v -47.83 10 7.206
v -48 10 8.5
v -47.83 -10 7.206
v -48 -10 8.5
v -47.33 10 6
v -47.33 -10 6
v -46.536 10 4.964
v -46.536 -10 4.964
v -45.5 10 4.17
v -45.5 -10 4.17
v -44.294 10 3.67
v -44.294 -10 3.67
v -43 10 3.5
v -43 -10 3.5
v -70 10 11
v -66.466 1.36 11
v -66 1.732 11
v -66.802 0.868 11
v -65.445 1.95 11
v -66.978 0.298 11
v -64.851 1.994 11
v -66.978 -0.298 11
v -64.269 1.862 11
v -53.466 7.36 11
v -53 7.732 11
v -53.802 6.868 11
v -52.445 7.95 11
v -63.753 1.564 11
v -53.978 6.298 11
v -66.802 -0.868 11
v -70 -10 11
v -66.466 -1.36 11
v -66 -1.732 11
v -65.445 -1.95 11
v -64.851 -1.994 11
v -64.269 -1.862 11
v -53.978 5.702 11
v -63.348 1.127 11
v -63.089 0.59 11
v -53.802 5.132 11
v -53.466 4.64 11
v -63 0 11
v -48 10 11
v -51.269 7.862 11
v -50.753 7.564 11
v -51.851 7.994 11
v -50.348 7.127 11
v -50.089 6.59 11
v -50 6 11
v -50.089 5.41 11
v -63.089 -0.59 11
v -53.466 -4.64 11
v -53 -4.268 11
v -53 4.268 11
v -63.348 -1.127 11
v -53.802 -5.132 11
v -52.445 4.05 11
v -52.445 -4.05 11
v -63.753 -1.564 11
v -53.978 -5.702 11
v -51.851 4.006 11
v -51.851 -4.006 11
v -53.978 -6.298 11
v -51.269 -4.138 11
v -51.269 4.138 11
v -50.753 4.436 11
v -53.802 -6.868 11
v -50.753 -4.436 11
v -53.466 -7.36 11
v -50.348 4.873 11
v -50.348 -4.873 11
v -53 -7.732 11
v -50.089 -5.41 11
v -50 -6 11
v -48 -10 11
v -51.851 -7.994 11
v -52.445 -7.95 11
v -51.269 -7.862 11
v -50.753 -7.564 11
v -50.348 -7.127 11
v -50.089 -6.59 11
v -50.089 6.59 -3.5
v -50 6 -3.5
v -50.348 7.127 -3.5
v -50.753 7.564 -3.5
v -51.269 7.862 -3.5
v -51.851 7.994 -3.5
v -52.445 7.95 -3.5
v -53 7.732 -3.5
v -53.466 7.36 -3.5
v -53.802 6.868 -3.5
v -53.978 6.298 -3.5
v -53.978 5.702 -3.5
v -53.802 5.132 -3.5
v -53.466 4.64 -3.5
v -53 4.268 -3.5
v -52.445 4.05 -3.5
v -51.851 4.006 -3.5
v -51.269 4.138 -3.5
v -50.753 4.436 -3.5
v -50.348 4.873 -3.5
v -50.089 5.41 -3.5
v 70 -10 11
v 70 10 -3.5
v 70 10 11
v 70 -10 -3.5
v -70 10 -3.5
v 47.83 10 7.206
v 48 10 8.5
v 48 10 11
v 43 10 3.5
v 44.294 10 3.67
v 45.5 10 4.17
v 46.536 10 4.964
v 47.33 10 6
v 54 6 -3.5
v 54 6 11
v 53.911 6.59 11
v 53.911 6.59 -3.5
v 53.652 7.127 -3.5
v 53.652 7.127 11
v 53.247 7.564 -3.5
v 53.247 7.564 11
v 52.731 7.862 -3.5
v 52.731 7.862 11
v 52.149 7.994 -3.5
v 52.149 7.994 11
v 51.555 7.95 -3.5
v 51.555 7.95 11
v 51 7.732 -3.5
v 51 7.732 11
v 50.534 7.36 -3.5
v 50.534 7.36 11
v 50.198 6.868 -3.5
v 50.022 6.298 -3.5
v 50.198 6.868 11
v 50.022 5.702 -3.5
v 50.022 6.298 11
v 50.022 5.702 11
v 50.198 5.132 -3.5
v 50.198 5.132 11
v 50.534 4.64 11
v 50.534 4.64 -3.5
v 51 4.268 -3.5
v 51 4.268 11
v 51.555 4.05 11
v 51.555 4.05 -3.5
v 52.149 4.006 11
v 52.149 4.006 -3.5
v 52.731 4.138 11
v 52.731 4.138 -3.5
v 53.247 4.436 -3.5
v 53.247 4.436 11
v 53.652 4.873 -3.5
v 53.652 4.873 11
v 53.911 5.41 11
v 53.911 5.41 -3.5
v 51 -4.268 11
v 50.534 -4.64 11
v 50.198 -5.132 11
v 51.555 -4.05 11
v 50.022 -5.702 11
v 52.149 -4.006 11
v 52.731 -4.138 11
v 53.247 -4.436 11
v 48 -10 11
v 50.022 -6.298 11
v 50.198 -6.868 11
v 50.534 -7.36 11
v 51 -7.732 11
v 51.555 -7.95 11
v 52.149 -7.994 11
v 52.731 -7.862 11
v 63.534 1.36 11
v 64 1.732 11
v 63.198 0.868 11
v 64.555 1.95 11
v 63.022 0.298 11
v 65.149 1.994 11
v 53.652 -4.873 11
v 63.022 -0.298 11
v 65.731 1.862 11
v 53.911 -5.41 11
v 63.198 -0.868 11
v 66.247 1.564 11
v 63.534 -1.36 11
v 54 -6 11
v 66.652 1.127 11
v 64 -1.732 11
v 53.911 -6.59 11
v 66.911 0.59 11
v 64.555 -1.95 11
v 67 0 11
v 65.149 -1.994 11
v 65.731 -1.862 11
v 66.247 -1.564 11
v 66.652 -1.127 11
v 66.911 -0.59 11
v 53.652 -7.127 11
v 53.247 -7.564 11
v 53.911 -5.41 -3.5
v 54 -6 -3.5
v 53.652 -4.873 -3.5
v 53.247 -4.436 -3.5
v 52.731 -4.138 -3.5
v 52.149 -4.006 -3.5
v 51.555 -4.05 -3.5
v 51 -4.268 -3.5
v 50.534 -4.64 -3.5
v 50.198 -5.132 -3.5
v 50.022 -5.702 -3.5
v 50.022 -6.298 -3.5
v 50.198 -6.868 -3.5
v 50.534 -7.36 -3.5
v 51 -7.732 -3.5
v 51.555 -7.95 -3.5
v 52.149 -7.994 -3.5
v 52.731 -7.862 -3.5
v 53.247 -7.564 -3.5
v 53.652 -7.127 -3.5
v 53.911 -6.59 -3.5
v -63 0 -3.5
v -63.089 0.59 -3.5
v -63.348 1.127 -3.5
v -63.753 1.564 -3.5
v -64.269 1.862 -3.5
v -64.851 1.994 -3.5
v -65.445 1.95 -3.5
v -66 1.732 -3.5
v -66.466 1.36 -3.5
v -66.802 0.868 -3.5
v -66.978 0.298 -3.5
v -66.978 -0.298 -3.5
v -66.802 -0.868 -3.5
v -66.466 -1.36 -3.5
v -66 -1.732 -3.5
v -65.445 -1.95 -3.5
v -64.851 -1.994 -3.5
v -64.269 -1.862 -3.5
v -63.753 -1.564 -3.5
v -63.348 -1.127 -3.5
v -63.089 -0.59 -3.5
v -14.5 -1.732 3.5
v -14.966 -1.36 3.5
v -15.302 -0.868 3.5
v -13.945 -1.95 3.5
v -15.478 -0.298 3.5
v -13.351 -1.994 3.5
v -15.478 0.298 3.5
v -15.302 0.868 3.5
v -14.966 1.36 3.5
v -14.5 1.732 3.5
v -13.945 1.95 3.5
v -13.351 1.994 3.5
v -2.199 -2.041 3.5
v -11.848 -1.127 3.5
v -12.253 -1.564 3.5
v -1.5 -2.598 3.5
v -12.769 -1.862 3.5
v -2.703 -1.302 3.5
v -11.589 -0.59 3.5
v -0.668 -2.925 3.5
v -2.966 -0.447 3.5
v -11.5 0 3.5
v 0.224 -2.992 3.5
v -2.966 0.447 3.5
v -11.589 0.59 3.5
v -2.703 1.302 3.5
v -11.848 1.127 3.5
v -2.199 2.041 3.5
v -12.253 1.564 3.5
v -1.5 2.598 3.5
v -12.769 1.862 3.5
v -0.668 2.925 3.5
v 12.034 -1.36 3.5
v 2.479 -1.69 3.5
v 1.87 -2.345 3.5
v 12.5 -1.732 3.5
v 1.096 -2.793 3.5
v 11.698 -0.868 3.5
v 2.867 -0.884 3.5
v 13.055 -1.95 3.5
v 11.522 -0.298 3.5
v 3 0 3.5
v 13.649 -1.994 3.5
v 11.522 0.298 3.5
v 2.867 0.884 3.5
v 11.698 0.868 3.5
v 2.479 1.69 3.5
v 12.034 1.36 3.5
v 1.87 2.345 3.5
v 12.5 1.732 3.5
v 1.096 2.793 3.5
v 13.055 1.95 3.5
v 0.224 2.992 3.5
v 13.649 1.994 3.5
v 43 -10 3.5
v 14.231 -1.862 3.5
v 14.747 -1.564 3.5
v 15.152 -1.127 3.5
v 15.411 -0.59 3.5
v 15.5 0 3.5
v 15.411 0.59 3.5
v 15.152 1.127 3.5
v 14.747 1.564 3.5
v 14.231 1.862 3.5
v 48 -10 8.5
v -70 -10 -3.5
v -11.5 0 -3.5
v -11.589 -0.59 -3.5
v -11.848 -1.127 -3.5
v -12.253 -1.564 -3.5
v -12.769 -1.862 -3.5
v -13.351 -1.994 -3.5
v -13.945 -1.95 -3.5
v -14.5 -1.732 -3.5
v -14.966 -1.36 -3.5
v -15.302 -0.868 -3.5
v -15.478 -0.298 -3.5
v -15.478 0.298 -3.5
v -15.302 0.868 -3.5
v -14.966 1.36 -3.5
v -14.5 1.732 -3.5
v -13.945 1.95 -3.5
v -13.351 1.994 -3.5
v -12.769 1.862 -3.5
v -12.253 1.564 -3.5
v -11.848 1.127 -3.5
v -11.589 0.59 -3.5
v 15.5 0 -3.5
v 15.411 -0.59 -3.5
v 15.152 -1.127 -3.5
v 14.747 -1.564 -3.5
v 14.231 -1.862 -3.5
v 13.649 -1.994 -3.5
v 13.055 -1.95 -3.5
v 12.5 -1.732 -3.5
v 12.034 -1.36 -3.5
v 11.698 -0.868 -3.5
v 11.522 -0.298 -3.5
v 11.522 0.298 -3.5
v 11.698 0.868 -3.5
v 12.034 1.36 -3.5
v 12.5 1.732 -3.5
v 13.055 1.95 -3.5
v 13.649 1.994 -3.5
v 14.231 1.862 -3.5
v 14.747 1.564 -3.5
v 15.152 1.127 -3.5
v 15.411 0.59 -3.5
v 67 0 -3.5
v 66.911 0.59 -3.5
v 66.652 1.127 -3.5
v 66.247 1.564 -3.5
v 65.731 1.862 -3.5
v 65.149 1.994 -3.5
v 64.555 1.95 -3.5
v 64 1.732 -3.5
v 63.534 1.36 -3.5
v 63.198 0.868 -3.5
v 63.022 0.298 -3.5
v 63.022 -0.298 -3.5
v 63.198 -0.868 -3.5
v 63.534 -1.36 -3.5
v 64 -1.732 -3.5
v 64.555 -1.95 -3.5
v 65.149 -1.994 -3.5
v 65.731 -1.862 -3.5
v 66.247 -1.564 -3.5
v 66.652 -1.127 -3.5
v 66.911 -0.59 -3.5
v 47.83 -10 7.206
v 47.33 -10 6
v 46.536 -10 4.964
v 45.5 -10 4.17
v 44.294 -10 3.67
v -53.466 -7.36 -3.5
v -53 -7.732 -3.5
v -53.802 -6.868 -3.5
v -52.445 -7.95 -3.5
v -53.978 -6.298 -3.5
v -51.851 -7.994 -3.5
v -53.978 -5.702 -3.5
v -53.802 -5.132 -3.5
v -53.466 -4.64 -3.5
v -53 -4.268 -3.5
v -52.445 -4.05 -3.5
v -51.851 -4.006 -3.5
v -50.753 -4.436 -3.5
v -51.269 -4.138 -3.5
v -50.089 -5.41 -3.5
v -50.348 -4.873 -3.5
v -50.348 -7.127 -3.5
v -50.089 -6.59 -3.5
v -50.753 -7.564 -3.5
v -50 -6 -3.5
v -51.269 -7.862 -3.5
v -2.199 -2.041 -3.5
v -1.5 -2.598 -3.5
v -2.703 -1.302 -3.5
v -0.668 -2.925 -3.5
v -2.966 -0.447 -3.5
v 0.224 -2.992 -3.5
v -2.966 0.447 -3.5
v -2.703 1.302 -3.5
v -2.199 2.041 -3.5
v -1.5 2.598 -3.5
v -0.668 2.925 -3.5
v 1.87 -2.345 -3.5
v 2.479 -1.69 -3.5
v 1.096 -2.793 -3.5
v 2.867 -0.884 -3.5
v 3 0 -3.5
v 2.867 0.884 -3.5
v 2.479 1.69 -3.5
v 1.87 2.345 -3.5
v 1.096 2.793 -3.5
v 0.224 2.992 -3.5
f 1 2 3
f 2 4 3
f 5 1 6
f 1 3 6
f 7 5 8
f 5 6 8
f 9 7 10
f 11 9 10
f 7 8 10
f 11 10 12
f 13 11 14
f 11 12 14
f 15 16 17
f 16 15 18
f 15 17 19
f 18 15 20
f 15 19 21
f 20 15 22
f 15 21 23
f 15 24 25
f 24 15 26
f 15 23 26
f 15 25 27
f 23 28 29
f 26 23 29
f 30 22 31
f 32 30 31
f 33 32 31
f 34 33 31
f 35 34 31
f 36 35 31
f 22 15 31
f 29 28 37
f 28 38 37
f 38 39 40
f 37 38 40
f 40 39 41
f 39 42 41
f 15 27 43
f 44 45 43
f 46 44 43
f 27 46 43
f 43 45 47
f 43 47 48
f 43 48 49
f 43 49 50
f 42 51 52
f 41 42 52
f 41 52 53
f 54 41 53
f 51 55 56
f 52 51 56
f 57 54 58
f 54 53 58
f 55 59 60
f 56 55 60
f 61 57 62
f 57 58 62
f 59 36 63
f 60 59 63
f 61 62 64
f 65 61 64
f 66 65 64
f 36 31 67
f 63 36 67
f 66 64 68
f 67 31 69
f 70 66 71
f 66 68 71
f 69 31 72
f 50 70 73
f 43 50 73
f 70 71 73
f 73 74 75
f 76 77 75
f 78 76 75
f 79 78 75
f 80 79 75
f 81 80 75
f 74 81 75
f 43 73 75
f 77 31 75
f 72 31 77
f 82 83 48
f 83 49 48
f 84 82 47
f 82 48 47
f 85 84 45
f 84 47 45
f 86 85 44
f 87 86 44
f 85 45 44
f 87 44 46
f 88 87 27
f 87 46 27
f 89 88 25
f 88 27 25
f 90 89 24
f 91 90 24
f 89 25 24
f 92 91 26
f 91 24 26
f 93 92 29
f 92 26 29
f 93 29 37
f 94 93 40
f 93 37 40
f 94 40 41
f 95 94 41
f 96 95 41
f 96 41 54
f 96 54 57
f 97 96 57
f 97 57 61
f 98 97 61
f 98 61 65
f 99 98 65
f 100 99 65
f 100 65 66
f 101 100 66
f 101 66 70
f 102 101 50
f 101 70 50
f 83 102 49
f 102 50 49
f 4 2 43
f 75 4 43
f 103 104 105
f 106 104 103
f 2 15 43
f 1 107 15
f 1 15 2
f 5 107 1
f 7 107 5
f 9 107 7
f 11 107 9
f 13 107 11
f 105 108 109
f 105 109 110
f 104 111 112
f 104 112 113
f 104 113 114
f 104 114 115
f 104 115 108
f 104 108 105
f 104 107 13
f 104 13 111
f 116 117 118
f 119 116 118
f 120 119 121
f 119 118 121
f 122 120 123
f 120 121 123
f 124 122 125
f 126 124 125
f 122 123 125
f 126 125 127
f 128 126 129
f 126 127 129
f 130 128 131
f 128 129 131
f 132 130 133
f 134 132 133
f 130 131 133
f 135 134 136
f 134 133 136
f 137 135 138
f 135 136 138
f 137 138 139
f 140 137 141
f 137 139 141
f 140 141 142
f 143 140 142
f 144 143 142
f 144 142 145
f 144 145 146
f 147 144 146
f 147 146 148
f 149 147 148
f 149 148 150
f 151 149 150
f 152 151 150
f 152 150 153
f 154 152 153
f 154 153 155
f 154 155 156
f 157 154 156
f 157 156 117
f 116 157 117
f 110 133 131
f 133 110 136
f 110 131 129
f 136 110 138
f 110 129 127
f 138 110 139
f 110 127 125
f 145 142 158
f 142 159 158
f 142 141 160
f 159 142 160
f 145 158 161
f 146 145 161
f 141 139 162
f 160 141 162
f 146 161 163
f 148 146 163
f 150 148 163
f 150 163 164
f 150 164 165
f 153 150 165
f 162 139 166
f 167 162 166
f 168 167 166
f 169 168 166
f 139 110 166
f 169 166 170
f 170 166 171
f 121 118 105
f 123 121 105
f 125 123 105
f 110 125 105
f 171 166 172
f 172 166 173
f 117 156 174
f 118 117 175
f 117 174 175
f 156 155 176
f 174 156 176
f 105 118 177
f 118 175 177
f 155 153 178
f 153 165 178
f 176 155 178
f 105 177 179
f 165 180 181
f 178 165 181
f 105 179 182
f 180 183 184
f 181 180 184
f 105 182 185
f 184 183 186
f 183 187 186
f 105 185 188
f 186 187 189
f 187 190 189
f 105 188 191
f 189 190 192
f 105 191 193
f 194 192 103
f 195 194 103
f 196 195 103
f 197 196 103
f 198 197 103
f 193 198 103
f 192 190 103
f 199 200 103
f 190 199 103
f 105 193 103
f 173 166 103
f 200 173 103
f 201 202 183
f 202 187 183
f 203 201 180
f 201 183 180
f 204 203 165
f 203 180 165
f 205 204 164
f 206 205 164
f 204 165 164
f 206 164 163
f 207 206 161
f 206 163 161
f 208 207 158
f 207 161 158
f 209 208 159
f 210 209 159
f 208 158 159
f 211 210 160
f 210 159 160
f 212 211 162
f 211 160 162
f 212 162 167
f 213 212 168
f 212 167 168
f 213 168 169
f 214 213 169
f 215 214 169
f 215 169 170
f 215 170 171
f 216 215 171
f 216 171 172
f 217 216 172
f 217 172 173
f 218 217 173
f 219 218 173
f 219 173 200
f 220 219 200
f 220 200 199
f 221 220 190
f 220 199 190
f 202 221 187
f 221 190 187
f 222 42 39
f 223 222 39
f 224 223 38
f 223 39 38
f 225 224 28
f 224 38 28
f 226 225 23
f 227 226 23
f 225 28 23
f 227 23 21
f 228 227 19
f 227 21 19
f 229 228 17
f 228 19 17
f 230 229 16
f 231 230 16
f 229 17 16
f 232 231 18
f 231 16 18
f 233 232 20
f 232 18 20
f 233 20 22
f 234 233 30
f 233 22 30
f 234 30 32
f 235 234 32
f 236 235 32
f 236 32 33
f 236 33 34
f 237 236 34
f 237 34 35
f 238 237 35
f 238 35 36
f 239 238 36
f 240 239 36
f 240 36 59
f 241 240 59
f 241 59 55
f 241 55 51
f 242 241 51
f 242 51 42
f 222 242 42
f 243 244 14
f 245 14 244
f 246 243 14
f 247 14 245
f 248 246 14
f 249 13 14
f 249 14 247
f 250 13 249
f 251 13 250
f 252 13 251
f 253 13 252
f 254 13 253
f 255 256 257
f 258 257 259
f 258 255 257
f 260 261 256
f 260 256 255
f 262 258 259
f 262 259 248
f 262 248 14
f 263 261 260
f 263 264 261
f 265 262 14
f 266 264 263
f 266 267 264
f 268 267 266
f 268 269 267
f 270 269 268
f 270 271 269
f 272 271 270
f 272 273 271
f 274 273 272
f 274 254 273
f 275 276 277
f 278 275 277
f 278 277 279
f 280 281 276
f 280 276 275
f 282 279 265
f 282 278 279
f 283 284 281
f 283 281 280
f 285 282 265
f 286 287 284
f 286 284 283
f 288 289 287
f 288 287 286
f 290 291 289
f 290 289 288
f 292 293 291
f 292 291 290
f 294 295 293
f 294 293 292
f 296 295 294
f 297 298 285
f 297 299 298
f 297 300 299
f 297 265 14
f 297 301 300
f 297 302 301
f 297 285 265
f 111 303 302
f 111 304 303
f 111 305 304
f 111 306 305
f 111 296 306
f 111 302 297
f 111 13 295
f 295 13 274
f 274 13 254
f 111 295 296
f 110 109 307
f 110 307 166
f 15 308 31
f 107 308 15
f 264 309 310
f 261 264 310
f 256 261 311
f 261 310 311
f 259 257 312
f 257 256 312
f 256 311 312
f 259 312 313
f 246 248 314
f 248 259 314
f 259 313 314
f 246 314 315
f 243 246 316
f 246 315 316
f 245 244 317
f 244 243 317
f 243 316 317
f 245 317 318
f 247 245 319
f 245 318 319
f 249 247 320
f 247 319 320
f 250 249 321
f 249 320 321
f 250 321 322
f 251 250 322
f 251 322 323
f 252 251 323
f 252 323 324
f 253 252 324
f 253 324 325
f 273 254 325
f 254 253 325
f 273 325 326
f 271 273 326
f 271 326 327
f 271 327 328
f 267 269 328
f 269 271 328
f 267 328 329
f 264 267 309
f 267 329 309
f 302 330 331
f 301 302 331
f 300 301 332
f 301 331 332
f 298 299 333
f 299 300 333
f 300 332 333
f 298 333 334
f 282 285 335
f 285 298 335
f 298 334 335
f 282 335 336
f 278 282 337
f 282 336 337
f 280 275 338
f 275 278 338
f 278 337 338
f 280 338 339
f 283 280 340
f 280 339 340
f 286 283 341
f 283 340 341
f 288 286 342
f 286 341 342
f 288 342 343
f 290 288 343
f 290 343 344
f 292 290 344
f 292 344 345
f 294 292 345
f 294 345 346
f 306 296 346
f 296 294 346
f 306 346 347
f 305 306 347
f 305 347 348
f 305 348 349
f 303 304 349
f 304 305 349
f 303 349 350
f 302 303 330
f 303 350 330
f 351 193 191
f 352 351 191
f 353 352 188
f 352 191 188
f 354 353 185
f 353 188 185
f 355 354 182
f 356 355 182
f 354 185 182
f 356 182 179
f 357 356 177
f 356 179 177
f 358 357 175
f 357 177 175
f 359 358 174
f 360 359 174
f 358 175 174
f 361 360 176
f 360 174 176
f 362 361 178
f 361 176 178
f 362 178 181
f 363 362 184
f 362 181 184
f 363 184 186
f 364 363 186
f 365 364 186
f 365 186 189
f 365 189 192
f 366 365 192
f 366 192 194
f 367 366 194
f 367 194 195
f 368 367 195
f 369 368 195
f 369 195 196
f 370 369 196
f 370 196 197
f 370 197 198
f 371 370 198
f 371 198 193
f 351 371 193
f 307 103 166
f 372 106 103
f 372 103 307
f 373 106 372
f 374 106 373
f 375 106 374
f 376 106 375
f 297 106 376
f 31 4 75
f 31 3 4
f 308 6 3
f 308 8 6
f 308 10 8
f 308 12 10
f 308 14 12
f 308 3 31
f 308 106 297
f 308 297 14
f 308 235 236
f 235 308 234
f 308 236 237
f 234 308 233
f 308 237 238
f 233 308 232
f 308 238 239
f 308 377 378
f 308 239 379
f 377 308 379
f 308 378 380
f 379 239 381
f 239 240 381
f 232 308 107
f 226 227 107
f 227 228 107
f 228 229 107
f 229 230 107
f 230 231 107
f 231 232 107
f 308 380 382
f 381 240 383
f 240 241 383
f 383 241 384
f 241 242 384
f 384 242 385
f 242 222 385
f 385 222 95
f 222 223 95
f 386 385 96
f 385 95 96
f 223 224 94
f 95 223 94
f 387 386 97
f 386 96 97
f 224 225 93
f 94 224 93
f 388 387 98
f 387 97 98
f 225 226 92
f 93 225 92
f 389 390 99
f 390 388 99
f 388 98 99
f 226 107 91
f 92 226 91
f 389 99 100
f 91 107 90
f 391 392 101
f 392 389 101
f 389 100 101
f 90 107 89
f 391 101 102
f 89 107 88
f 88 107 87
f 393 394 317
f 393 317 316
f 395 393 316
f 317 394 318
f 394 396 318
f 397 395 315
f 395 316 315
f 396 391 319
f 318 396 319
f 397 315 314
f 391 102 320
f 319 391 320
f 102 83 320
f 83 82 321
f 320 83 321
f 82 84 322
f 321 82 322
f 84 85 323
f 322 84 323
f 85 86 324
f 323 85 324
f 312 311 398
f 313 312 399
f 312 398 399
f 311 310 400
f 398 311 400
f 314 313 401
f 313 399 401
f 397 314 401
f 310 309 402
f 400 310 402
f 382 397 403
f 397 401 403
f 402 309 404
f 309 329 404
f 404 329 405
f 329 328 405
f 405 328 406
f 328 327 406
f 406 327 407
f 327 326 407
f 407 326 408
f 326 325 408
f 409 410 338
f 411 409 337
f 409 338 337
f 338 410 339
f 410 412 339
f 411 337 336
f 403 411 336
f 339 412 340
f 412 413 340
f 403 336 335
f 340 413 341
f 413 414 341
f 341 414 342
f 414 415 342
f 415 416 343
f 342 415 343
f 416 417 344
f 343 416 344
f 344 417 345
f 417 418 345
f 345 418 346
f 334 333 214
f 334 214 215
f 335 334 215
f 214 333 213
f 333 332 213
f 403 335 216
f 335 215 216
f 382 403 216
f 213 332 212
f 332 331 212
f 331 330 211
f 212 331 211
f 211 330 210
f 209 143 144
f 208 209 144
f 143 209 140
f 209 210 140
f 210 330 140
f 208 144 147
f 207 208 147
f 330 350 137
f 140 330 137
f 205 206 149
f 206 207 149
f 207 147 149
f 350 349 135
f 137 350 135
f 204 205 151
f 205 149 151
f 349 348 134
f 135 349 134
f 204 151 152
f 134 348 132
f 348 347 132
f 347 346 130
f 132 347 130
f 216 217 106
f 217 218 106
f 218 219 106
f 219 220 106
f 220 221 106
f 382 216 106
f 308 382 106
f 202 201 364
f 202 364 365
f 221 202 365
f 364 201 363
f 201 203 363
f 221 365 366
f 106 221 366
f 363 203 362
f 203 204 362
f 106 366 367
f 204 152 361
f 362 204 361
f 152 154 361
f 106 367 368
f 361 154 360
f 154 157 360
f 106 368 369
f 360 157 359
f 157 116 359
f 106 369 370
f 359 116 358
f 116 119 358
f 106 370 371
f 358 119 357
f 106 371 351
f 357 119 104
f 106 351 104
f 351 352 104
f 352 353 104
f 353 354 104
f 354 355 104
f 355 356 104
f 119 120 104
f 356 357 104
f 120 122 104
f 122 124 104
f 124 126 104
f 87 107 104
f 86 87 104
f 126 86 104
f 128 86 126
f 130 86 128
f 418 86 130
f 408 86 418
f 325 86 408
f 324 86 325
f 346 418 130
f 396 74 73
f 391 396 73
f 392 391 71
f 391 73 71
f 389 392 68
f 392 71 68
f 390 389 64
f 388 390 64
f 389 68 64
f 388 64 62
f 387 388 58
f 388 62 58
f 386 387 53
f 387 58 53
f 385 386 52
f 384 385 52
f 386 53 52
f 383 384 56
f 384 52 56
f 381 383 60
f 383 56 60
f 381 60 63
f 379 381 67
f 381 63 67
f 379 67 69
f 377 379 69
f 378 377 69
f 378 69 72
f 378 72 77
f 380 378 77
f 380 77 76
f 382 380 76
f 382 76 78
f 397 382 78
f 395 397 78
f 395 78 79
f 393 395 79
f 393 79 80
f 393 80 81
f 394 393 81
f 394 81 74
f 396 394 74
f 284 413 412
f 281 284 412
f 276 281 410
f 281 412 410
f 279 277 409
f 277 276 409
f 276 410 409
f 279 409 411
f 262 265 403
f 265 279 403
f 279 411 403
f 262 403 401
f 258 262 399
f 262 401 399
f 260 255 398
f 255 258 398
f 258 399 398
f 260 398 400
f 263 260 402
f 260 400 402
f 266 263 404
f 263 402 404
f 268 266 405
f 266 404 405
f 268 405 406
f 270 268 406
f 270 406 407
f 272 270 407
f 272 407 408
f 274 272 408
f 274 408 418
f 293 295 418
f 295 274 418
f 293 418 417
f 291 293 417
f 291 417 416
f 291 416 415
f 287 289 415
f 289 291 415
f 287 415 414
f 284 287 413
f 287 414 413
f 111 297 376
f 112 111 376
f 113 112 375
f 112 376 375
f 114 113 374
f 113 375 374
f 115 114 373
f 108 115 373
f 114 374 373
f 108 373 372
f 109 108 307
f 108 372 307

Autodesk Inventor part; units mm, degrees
ref_plane "YZ Plane" through (0, 0, 0) normal (1, 0, 0) x (0, 1, 0)
ref_plane "XZ Plane" through (0, 0, 0) normal (0, 1, 0) x (-1, 0, 0)
ref_plane "XY Plane" through (0, 0, 0) normal (0, 0, 1) x (1, 0, 0)
sketch "Sketch1" plane through (0, 0, 0) normal (0, 0, 1) x (1, 0, 0)
  line L0 (-70, 10) -> (70, 10)
  line L1 (70, 10) -> (70, -10)
  line L2 (70, -10) -> (-70, -10)
  line L3 (-70, -10) -> (-70, 10)
  line L4 (-70, 10) -> (70, -10) construction
  line L5 (70, 10) -> (-70, -10) construction
  line L6 (0, 0) -> (-13.5, 0) construction
  line L7 (-13.5, 0) -> (13.5, 0) construction
  circle A0 centre (-13.5, 0) radius 2
  circle A1 centre (13.5, 0) radius 2
  circle A2 centre (0, 0) radius 3
  dimension "d0" = 140
  dimension "d1" = 20
  dimension "d2" = 13.5
  dimension "d3" = 27
  dimension "d4" = 4
  dimension "d5" = 4
  dimension "d6" = 6
extrude "Extrusion1" add sketch "Sketch1" along normal mid plane 7
sketch "Sketch2" plane through (-70, -10, 3.5) normal (0, -1, 0) x (1, 0, 0)
  line L0 (70, -3.5) -> (30, -3.5) construction
  line L1 (30, -3.5) -> (110, -3.5) construction
  line L2 (0, 0) -> (140, 0) projected
  line L3 (22, 5) -> (22, 7.5)
  line L4 (22, 7.5) -> (2, 7.5)
  line L5 (0, 5.5) -> (0, 0)
  line L6 (0, 0) -> (22, 0)
  line L7 (70, -9.525) -> (70, 0) construction
  line L8 (27, 0) -> (140, 0)
  arc A0 (22, 5) -> (27, 0) centre (27, 5) ccw
  line L9 (27, 0) -> (22, 0)
  line L10 (140, 0) -> (0, 0)
  line L11 (118, 5) -> (118, 7.5)
  line L12 (118, 7.5) -> (138, 7.5)
  line L13 (140, 5.5) -> (140, 0)
  arc A1 (113, 0) -> (118, 5) centre (113, 5) ccw
  line L14 (140, 5.5) -> (140, 7.5)
  line L15 (140, 7.5) -> (138, 7.5)
  line L16 (0, 5.5) -> (0, 7.5)
  line L17 (0, 7.5) -> (2, 7.5)
  point P0 (113, 0)
  dimension "d13" = 40
  dimension "d14" = 80
  dimension "d15" = 7.5
  dimension "d16" = 5
extrude "Extrusion2" add sketch "Sketch2" against normal blind 20
sketch "Sketch3" plane through (48, -10, 11) normal (0, 0, 1) x (1, 0, 0)
  line L0 (-48, 10) -> (12, 10) construction
  line L1 (12, 10) -> (17, 10) construction
  circle A0 centre (17, 10) radius 2
  line L2 (12, 10) -> (4, 10) construction
  line L3 (4, 10) -> (4, 4) construction
  line L4 (4, 4) -> (4, 16) construction
  circle A1 centre (4, 4) radius 2
  circle A2 centre (4, 16) radius 2
  line L5 (-48, 10) -> (-48, 19.9246) construction
  circle A3 centre (-113, 10) radius 2
  circle A4 centre (-100, 4) radius 2
  circle A5 centre (-100, 16) radius 2
  dimension "d20" = 60
  dimension "d21" = 5
  dimension "d22" = 4
  dimension "d23" = 8
  dimension "d24" = 6
  dimension "d25" = 12
  dimension "d26" = 4
  dimension "d27" = 4
extrude "Extrusion3" cut sketch "Sketch3" against normal blind 17.5
equation "\"BendRadius\" = Thickness"
equation "\"BendReliefWidth\" = Thickness"
equation "\"BendReliefDepth\" = 0.5 * Thickness"
equation "\"CornerReliefSize\" = 4 * Thickness"
equation "\"MinimumRemnant\" = 2 * Thickness"
equation "\"TransitionRadius\" = BendRadius"
equation "\"JacobiRadiusSize\" = BendRadius"
equation "\"GapSize\" = Thickness"
equation "\"Thickness\" = 3.048"
properties part number "Uchwyt na ramę" material "Steel"
